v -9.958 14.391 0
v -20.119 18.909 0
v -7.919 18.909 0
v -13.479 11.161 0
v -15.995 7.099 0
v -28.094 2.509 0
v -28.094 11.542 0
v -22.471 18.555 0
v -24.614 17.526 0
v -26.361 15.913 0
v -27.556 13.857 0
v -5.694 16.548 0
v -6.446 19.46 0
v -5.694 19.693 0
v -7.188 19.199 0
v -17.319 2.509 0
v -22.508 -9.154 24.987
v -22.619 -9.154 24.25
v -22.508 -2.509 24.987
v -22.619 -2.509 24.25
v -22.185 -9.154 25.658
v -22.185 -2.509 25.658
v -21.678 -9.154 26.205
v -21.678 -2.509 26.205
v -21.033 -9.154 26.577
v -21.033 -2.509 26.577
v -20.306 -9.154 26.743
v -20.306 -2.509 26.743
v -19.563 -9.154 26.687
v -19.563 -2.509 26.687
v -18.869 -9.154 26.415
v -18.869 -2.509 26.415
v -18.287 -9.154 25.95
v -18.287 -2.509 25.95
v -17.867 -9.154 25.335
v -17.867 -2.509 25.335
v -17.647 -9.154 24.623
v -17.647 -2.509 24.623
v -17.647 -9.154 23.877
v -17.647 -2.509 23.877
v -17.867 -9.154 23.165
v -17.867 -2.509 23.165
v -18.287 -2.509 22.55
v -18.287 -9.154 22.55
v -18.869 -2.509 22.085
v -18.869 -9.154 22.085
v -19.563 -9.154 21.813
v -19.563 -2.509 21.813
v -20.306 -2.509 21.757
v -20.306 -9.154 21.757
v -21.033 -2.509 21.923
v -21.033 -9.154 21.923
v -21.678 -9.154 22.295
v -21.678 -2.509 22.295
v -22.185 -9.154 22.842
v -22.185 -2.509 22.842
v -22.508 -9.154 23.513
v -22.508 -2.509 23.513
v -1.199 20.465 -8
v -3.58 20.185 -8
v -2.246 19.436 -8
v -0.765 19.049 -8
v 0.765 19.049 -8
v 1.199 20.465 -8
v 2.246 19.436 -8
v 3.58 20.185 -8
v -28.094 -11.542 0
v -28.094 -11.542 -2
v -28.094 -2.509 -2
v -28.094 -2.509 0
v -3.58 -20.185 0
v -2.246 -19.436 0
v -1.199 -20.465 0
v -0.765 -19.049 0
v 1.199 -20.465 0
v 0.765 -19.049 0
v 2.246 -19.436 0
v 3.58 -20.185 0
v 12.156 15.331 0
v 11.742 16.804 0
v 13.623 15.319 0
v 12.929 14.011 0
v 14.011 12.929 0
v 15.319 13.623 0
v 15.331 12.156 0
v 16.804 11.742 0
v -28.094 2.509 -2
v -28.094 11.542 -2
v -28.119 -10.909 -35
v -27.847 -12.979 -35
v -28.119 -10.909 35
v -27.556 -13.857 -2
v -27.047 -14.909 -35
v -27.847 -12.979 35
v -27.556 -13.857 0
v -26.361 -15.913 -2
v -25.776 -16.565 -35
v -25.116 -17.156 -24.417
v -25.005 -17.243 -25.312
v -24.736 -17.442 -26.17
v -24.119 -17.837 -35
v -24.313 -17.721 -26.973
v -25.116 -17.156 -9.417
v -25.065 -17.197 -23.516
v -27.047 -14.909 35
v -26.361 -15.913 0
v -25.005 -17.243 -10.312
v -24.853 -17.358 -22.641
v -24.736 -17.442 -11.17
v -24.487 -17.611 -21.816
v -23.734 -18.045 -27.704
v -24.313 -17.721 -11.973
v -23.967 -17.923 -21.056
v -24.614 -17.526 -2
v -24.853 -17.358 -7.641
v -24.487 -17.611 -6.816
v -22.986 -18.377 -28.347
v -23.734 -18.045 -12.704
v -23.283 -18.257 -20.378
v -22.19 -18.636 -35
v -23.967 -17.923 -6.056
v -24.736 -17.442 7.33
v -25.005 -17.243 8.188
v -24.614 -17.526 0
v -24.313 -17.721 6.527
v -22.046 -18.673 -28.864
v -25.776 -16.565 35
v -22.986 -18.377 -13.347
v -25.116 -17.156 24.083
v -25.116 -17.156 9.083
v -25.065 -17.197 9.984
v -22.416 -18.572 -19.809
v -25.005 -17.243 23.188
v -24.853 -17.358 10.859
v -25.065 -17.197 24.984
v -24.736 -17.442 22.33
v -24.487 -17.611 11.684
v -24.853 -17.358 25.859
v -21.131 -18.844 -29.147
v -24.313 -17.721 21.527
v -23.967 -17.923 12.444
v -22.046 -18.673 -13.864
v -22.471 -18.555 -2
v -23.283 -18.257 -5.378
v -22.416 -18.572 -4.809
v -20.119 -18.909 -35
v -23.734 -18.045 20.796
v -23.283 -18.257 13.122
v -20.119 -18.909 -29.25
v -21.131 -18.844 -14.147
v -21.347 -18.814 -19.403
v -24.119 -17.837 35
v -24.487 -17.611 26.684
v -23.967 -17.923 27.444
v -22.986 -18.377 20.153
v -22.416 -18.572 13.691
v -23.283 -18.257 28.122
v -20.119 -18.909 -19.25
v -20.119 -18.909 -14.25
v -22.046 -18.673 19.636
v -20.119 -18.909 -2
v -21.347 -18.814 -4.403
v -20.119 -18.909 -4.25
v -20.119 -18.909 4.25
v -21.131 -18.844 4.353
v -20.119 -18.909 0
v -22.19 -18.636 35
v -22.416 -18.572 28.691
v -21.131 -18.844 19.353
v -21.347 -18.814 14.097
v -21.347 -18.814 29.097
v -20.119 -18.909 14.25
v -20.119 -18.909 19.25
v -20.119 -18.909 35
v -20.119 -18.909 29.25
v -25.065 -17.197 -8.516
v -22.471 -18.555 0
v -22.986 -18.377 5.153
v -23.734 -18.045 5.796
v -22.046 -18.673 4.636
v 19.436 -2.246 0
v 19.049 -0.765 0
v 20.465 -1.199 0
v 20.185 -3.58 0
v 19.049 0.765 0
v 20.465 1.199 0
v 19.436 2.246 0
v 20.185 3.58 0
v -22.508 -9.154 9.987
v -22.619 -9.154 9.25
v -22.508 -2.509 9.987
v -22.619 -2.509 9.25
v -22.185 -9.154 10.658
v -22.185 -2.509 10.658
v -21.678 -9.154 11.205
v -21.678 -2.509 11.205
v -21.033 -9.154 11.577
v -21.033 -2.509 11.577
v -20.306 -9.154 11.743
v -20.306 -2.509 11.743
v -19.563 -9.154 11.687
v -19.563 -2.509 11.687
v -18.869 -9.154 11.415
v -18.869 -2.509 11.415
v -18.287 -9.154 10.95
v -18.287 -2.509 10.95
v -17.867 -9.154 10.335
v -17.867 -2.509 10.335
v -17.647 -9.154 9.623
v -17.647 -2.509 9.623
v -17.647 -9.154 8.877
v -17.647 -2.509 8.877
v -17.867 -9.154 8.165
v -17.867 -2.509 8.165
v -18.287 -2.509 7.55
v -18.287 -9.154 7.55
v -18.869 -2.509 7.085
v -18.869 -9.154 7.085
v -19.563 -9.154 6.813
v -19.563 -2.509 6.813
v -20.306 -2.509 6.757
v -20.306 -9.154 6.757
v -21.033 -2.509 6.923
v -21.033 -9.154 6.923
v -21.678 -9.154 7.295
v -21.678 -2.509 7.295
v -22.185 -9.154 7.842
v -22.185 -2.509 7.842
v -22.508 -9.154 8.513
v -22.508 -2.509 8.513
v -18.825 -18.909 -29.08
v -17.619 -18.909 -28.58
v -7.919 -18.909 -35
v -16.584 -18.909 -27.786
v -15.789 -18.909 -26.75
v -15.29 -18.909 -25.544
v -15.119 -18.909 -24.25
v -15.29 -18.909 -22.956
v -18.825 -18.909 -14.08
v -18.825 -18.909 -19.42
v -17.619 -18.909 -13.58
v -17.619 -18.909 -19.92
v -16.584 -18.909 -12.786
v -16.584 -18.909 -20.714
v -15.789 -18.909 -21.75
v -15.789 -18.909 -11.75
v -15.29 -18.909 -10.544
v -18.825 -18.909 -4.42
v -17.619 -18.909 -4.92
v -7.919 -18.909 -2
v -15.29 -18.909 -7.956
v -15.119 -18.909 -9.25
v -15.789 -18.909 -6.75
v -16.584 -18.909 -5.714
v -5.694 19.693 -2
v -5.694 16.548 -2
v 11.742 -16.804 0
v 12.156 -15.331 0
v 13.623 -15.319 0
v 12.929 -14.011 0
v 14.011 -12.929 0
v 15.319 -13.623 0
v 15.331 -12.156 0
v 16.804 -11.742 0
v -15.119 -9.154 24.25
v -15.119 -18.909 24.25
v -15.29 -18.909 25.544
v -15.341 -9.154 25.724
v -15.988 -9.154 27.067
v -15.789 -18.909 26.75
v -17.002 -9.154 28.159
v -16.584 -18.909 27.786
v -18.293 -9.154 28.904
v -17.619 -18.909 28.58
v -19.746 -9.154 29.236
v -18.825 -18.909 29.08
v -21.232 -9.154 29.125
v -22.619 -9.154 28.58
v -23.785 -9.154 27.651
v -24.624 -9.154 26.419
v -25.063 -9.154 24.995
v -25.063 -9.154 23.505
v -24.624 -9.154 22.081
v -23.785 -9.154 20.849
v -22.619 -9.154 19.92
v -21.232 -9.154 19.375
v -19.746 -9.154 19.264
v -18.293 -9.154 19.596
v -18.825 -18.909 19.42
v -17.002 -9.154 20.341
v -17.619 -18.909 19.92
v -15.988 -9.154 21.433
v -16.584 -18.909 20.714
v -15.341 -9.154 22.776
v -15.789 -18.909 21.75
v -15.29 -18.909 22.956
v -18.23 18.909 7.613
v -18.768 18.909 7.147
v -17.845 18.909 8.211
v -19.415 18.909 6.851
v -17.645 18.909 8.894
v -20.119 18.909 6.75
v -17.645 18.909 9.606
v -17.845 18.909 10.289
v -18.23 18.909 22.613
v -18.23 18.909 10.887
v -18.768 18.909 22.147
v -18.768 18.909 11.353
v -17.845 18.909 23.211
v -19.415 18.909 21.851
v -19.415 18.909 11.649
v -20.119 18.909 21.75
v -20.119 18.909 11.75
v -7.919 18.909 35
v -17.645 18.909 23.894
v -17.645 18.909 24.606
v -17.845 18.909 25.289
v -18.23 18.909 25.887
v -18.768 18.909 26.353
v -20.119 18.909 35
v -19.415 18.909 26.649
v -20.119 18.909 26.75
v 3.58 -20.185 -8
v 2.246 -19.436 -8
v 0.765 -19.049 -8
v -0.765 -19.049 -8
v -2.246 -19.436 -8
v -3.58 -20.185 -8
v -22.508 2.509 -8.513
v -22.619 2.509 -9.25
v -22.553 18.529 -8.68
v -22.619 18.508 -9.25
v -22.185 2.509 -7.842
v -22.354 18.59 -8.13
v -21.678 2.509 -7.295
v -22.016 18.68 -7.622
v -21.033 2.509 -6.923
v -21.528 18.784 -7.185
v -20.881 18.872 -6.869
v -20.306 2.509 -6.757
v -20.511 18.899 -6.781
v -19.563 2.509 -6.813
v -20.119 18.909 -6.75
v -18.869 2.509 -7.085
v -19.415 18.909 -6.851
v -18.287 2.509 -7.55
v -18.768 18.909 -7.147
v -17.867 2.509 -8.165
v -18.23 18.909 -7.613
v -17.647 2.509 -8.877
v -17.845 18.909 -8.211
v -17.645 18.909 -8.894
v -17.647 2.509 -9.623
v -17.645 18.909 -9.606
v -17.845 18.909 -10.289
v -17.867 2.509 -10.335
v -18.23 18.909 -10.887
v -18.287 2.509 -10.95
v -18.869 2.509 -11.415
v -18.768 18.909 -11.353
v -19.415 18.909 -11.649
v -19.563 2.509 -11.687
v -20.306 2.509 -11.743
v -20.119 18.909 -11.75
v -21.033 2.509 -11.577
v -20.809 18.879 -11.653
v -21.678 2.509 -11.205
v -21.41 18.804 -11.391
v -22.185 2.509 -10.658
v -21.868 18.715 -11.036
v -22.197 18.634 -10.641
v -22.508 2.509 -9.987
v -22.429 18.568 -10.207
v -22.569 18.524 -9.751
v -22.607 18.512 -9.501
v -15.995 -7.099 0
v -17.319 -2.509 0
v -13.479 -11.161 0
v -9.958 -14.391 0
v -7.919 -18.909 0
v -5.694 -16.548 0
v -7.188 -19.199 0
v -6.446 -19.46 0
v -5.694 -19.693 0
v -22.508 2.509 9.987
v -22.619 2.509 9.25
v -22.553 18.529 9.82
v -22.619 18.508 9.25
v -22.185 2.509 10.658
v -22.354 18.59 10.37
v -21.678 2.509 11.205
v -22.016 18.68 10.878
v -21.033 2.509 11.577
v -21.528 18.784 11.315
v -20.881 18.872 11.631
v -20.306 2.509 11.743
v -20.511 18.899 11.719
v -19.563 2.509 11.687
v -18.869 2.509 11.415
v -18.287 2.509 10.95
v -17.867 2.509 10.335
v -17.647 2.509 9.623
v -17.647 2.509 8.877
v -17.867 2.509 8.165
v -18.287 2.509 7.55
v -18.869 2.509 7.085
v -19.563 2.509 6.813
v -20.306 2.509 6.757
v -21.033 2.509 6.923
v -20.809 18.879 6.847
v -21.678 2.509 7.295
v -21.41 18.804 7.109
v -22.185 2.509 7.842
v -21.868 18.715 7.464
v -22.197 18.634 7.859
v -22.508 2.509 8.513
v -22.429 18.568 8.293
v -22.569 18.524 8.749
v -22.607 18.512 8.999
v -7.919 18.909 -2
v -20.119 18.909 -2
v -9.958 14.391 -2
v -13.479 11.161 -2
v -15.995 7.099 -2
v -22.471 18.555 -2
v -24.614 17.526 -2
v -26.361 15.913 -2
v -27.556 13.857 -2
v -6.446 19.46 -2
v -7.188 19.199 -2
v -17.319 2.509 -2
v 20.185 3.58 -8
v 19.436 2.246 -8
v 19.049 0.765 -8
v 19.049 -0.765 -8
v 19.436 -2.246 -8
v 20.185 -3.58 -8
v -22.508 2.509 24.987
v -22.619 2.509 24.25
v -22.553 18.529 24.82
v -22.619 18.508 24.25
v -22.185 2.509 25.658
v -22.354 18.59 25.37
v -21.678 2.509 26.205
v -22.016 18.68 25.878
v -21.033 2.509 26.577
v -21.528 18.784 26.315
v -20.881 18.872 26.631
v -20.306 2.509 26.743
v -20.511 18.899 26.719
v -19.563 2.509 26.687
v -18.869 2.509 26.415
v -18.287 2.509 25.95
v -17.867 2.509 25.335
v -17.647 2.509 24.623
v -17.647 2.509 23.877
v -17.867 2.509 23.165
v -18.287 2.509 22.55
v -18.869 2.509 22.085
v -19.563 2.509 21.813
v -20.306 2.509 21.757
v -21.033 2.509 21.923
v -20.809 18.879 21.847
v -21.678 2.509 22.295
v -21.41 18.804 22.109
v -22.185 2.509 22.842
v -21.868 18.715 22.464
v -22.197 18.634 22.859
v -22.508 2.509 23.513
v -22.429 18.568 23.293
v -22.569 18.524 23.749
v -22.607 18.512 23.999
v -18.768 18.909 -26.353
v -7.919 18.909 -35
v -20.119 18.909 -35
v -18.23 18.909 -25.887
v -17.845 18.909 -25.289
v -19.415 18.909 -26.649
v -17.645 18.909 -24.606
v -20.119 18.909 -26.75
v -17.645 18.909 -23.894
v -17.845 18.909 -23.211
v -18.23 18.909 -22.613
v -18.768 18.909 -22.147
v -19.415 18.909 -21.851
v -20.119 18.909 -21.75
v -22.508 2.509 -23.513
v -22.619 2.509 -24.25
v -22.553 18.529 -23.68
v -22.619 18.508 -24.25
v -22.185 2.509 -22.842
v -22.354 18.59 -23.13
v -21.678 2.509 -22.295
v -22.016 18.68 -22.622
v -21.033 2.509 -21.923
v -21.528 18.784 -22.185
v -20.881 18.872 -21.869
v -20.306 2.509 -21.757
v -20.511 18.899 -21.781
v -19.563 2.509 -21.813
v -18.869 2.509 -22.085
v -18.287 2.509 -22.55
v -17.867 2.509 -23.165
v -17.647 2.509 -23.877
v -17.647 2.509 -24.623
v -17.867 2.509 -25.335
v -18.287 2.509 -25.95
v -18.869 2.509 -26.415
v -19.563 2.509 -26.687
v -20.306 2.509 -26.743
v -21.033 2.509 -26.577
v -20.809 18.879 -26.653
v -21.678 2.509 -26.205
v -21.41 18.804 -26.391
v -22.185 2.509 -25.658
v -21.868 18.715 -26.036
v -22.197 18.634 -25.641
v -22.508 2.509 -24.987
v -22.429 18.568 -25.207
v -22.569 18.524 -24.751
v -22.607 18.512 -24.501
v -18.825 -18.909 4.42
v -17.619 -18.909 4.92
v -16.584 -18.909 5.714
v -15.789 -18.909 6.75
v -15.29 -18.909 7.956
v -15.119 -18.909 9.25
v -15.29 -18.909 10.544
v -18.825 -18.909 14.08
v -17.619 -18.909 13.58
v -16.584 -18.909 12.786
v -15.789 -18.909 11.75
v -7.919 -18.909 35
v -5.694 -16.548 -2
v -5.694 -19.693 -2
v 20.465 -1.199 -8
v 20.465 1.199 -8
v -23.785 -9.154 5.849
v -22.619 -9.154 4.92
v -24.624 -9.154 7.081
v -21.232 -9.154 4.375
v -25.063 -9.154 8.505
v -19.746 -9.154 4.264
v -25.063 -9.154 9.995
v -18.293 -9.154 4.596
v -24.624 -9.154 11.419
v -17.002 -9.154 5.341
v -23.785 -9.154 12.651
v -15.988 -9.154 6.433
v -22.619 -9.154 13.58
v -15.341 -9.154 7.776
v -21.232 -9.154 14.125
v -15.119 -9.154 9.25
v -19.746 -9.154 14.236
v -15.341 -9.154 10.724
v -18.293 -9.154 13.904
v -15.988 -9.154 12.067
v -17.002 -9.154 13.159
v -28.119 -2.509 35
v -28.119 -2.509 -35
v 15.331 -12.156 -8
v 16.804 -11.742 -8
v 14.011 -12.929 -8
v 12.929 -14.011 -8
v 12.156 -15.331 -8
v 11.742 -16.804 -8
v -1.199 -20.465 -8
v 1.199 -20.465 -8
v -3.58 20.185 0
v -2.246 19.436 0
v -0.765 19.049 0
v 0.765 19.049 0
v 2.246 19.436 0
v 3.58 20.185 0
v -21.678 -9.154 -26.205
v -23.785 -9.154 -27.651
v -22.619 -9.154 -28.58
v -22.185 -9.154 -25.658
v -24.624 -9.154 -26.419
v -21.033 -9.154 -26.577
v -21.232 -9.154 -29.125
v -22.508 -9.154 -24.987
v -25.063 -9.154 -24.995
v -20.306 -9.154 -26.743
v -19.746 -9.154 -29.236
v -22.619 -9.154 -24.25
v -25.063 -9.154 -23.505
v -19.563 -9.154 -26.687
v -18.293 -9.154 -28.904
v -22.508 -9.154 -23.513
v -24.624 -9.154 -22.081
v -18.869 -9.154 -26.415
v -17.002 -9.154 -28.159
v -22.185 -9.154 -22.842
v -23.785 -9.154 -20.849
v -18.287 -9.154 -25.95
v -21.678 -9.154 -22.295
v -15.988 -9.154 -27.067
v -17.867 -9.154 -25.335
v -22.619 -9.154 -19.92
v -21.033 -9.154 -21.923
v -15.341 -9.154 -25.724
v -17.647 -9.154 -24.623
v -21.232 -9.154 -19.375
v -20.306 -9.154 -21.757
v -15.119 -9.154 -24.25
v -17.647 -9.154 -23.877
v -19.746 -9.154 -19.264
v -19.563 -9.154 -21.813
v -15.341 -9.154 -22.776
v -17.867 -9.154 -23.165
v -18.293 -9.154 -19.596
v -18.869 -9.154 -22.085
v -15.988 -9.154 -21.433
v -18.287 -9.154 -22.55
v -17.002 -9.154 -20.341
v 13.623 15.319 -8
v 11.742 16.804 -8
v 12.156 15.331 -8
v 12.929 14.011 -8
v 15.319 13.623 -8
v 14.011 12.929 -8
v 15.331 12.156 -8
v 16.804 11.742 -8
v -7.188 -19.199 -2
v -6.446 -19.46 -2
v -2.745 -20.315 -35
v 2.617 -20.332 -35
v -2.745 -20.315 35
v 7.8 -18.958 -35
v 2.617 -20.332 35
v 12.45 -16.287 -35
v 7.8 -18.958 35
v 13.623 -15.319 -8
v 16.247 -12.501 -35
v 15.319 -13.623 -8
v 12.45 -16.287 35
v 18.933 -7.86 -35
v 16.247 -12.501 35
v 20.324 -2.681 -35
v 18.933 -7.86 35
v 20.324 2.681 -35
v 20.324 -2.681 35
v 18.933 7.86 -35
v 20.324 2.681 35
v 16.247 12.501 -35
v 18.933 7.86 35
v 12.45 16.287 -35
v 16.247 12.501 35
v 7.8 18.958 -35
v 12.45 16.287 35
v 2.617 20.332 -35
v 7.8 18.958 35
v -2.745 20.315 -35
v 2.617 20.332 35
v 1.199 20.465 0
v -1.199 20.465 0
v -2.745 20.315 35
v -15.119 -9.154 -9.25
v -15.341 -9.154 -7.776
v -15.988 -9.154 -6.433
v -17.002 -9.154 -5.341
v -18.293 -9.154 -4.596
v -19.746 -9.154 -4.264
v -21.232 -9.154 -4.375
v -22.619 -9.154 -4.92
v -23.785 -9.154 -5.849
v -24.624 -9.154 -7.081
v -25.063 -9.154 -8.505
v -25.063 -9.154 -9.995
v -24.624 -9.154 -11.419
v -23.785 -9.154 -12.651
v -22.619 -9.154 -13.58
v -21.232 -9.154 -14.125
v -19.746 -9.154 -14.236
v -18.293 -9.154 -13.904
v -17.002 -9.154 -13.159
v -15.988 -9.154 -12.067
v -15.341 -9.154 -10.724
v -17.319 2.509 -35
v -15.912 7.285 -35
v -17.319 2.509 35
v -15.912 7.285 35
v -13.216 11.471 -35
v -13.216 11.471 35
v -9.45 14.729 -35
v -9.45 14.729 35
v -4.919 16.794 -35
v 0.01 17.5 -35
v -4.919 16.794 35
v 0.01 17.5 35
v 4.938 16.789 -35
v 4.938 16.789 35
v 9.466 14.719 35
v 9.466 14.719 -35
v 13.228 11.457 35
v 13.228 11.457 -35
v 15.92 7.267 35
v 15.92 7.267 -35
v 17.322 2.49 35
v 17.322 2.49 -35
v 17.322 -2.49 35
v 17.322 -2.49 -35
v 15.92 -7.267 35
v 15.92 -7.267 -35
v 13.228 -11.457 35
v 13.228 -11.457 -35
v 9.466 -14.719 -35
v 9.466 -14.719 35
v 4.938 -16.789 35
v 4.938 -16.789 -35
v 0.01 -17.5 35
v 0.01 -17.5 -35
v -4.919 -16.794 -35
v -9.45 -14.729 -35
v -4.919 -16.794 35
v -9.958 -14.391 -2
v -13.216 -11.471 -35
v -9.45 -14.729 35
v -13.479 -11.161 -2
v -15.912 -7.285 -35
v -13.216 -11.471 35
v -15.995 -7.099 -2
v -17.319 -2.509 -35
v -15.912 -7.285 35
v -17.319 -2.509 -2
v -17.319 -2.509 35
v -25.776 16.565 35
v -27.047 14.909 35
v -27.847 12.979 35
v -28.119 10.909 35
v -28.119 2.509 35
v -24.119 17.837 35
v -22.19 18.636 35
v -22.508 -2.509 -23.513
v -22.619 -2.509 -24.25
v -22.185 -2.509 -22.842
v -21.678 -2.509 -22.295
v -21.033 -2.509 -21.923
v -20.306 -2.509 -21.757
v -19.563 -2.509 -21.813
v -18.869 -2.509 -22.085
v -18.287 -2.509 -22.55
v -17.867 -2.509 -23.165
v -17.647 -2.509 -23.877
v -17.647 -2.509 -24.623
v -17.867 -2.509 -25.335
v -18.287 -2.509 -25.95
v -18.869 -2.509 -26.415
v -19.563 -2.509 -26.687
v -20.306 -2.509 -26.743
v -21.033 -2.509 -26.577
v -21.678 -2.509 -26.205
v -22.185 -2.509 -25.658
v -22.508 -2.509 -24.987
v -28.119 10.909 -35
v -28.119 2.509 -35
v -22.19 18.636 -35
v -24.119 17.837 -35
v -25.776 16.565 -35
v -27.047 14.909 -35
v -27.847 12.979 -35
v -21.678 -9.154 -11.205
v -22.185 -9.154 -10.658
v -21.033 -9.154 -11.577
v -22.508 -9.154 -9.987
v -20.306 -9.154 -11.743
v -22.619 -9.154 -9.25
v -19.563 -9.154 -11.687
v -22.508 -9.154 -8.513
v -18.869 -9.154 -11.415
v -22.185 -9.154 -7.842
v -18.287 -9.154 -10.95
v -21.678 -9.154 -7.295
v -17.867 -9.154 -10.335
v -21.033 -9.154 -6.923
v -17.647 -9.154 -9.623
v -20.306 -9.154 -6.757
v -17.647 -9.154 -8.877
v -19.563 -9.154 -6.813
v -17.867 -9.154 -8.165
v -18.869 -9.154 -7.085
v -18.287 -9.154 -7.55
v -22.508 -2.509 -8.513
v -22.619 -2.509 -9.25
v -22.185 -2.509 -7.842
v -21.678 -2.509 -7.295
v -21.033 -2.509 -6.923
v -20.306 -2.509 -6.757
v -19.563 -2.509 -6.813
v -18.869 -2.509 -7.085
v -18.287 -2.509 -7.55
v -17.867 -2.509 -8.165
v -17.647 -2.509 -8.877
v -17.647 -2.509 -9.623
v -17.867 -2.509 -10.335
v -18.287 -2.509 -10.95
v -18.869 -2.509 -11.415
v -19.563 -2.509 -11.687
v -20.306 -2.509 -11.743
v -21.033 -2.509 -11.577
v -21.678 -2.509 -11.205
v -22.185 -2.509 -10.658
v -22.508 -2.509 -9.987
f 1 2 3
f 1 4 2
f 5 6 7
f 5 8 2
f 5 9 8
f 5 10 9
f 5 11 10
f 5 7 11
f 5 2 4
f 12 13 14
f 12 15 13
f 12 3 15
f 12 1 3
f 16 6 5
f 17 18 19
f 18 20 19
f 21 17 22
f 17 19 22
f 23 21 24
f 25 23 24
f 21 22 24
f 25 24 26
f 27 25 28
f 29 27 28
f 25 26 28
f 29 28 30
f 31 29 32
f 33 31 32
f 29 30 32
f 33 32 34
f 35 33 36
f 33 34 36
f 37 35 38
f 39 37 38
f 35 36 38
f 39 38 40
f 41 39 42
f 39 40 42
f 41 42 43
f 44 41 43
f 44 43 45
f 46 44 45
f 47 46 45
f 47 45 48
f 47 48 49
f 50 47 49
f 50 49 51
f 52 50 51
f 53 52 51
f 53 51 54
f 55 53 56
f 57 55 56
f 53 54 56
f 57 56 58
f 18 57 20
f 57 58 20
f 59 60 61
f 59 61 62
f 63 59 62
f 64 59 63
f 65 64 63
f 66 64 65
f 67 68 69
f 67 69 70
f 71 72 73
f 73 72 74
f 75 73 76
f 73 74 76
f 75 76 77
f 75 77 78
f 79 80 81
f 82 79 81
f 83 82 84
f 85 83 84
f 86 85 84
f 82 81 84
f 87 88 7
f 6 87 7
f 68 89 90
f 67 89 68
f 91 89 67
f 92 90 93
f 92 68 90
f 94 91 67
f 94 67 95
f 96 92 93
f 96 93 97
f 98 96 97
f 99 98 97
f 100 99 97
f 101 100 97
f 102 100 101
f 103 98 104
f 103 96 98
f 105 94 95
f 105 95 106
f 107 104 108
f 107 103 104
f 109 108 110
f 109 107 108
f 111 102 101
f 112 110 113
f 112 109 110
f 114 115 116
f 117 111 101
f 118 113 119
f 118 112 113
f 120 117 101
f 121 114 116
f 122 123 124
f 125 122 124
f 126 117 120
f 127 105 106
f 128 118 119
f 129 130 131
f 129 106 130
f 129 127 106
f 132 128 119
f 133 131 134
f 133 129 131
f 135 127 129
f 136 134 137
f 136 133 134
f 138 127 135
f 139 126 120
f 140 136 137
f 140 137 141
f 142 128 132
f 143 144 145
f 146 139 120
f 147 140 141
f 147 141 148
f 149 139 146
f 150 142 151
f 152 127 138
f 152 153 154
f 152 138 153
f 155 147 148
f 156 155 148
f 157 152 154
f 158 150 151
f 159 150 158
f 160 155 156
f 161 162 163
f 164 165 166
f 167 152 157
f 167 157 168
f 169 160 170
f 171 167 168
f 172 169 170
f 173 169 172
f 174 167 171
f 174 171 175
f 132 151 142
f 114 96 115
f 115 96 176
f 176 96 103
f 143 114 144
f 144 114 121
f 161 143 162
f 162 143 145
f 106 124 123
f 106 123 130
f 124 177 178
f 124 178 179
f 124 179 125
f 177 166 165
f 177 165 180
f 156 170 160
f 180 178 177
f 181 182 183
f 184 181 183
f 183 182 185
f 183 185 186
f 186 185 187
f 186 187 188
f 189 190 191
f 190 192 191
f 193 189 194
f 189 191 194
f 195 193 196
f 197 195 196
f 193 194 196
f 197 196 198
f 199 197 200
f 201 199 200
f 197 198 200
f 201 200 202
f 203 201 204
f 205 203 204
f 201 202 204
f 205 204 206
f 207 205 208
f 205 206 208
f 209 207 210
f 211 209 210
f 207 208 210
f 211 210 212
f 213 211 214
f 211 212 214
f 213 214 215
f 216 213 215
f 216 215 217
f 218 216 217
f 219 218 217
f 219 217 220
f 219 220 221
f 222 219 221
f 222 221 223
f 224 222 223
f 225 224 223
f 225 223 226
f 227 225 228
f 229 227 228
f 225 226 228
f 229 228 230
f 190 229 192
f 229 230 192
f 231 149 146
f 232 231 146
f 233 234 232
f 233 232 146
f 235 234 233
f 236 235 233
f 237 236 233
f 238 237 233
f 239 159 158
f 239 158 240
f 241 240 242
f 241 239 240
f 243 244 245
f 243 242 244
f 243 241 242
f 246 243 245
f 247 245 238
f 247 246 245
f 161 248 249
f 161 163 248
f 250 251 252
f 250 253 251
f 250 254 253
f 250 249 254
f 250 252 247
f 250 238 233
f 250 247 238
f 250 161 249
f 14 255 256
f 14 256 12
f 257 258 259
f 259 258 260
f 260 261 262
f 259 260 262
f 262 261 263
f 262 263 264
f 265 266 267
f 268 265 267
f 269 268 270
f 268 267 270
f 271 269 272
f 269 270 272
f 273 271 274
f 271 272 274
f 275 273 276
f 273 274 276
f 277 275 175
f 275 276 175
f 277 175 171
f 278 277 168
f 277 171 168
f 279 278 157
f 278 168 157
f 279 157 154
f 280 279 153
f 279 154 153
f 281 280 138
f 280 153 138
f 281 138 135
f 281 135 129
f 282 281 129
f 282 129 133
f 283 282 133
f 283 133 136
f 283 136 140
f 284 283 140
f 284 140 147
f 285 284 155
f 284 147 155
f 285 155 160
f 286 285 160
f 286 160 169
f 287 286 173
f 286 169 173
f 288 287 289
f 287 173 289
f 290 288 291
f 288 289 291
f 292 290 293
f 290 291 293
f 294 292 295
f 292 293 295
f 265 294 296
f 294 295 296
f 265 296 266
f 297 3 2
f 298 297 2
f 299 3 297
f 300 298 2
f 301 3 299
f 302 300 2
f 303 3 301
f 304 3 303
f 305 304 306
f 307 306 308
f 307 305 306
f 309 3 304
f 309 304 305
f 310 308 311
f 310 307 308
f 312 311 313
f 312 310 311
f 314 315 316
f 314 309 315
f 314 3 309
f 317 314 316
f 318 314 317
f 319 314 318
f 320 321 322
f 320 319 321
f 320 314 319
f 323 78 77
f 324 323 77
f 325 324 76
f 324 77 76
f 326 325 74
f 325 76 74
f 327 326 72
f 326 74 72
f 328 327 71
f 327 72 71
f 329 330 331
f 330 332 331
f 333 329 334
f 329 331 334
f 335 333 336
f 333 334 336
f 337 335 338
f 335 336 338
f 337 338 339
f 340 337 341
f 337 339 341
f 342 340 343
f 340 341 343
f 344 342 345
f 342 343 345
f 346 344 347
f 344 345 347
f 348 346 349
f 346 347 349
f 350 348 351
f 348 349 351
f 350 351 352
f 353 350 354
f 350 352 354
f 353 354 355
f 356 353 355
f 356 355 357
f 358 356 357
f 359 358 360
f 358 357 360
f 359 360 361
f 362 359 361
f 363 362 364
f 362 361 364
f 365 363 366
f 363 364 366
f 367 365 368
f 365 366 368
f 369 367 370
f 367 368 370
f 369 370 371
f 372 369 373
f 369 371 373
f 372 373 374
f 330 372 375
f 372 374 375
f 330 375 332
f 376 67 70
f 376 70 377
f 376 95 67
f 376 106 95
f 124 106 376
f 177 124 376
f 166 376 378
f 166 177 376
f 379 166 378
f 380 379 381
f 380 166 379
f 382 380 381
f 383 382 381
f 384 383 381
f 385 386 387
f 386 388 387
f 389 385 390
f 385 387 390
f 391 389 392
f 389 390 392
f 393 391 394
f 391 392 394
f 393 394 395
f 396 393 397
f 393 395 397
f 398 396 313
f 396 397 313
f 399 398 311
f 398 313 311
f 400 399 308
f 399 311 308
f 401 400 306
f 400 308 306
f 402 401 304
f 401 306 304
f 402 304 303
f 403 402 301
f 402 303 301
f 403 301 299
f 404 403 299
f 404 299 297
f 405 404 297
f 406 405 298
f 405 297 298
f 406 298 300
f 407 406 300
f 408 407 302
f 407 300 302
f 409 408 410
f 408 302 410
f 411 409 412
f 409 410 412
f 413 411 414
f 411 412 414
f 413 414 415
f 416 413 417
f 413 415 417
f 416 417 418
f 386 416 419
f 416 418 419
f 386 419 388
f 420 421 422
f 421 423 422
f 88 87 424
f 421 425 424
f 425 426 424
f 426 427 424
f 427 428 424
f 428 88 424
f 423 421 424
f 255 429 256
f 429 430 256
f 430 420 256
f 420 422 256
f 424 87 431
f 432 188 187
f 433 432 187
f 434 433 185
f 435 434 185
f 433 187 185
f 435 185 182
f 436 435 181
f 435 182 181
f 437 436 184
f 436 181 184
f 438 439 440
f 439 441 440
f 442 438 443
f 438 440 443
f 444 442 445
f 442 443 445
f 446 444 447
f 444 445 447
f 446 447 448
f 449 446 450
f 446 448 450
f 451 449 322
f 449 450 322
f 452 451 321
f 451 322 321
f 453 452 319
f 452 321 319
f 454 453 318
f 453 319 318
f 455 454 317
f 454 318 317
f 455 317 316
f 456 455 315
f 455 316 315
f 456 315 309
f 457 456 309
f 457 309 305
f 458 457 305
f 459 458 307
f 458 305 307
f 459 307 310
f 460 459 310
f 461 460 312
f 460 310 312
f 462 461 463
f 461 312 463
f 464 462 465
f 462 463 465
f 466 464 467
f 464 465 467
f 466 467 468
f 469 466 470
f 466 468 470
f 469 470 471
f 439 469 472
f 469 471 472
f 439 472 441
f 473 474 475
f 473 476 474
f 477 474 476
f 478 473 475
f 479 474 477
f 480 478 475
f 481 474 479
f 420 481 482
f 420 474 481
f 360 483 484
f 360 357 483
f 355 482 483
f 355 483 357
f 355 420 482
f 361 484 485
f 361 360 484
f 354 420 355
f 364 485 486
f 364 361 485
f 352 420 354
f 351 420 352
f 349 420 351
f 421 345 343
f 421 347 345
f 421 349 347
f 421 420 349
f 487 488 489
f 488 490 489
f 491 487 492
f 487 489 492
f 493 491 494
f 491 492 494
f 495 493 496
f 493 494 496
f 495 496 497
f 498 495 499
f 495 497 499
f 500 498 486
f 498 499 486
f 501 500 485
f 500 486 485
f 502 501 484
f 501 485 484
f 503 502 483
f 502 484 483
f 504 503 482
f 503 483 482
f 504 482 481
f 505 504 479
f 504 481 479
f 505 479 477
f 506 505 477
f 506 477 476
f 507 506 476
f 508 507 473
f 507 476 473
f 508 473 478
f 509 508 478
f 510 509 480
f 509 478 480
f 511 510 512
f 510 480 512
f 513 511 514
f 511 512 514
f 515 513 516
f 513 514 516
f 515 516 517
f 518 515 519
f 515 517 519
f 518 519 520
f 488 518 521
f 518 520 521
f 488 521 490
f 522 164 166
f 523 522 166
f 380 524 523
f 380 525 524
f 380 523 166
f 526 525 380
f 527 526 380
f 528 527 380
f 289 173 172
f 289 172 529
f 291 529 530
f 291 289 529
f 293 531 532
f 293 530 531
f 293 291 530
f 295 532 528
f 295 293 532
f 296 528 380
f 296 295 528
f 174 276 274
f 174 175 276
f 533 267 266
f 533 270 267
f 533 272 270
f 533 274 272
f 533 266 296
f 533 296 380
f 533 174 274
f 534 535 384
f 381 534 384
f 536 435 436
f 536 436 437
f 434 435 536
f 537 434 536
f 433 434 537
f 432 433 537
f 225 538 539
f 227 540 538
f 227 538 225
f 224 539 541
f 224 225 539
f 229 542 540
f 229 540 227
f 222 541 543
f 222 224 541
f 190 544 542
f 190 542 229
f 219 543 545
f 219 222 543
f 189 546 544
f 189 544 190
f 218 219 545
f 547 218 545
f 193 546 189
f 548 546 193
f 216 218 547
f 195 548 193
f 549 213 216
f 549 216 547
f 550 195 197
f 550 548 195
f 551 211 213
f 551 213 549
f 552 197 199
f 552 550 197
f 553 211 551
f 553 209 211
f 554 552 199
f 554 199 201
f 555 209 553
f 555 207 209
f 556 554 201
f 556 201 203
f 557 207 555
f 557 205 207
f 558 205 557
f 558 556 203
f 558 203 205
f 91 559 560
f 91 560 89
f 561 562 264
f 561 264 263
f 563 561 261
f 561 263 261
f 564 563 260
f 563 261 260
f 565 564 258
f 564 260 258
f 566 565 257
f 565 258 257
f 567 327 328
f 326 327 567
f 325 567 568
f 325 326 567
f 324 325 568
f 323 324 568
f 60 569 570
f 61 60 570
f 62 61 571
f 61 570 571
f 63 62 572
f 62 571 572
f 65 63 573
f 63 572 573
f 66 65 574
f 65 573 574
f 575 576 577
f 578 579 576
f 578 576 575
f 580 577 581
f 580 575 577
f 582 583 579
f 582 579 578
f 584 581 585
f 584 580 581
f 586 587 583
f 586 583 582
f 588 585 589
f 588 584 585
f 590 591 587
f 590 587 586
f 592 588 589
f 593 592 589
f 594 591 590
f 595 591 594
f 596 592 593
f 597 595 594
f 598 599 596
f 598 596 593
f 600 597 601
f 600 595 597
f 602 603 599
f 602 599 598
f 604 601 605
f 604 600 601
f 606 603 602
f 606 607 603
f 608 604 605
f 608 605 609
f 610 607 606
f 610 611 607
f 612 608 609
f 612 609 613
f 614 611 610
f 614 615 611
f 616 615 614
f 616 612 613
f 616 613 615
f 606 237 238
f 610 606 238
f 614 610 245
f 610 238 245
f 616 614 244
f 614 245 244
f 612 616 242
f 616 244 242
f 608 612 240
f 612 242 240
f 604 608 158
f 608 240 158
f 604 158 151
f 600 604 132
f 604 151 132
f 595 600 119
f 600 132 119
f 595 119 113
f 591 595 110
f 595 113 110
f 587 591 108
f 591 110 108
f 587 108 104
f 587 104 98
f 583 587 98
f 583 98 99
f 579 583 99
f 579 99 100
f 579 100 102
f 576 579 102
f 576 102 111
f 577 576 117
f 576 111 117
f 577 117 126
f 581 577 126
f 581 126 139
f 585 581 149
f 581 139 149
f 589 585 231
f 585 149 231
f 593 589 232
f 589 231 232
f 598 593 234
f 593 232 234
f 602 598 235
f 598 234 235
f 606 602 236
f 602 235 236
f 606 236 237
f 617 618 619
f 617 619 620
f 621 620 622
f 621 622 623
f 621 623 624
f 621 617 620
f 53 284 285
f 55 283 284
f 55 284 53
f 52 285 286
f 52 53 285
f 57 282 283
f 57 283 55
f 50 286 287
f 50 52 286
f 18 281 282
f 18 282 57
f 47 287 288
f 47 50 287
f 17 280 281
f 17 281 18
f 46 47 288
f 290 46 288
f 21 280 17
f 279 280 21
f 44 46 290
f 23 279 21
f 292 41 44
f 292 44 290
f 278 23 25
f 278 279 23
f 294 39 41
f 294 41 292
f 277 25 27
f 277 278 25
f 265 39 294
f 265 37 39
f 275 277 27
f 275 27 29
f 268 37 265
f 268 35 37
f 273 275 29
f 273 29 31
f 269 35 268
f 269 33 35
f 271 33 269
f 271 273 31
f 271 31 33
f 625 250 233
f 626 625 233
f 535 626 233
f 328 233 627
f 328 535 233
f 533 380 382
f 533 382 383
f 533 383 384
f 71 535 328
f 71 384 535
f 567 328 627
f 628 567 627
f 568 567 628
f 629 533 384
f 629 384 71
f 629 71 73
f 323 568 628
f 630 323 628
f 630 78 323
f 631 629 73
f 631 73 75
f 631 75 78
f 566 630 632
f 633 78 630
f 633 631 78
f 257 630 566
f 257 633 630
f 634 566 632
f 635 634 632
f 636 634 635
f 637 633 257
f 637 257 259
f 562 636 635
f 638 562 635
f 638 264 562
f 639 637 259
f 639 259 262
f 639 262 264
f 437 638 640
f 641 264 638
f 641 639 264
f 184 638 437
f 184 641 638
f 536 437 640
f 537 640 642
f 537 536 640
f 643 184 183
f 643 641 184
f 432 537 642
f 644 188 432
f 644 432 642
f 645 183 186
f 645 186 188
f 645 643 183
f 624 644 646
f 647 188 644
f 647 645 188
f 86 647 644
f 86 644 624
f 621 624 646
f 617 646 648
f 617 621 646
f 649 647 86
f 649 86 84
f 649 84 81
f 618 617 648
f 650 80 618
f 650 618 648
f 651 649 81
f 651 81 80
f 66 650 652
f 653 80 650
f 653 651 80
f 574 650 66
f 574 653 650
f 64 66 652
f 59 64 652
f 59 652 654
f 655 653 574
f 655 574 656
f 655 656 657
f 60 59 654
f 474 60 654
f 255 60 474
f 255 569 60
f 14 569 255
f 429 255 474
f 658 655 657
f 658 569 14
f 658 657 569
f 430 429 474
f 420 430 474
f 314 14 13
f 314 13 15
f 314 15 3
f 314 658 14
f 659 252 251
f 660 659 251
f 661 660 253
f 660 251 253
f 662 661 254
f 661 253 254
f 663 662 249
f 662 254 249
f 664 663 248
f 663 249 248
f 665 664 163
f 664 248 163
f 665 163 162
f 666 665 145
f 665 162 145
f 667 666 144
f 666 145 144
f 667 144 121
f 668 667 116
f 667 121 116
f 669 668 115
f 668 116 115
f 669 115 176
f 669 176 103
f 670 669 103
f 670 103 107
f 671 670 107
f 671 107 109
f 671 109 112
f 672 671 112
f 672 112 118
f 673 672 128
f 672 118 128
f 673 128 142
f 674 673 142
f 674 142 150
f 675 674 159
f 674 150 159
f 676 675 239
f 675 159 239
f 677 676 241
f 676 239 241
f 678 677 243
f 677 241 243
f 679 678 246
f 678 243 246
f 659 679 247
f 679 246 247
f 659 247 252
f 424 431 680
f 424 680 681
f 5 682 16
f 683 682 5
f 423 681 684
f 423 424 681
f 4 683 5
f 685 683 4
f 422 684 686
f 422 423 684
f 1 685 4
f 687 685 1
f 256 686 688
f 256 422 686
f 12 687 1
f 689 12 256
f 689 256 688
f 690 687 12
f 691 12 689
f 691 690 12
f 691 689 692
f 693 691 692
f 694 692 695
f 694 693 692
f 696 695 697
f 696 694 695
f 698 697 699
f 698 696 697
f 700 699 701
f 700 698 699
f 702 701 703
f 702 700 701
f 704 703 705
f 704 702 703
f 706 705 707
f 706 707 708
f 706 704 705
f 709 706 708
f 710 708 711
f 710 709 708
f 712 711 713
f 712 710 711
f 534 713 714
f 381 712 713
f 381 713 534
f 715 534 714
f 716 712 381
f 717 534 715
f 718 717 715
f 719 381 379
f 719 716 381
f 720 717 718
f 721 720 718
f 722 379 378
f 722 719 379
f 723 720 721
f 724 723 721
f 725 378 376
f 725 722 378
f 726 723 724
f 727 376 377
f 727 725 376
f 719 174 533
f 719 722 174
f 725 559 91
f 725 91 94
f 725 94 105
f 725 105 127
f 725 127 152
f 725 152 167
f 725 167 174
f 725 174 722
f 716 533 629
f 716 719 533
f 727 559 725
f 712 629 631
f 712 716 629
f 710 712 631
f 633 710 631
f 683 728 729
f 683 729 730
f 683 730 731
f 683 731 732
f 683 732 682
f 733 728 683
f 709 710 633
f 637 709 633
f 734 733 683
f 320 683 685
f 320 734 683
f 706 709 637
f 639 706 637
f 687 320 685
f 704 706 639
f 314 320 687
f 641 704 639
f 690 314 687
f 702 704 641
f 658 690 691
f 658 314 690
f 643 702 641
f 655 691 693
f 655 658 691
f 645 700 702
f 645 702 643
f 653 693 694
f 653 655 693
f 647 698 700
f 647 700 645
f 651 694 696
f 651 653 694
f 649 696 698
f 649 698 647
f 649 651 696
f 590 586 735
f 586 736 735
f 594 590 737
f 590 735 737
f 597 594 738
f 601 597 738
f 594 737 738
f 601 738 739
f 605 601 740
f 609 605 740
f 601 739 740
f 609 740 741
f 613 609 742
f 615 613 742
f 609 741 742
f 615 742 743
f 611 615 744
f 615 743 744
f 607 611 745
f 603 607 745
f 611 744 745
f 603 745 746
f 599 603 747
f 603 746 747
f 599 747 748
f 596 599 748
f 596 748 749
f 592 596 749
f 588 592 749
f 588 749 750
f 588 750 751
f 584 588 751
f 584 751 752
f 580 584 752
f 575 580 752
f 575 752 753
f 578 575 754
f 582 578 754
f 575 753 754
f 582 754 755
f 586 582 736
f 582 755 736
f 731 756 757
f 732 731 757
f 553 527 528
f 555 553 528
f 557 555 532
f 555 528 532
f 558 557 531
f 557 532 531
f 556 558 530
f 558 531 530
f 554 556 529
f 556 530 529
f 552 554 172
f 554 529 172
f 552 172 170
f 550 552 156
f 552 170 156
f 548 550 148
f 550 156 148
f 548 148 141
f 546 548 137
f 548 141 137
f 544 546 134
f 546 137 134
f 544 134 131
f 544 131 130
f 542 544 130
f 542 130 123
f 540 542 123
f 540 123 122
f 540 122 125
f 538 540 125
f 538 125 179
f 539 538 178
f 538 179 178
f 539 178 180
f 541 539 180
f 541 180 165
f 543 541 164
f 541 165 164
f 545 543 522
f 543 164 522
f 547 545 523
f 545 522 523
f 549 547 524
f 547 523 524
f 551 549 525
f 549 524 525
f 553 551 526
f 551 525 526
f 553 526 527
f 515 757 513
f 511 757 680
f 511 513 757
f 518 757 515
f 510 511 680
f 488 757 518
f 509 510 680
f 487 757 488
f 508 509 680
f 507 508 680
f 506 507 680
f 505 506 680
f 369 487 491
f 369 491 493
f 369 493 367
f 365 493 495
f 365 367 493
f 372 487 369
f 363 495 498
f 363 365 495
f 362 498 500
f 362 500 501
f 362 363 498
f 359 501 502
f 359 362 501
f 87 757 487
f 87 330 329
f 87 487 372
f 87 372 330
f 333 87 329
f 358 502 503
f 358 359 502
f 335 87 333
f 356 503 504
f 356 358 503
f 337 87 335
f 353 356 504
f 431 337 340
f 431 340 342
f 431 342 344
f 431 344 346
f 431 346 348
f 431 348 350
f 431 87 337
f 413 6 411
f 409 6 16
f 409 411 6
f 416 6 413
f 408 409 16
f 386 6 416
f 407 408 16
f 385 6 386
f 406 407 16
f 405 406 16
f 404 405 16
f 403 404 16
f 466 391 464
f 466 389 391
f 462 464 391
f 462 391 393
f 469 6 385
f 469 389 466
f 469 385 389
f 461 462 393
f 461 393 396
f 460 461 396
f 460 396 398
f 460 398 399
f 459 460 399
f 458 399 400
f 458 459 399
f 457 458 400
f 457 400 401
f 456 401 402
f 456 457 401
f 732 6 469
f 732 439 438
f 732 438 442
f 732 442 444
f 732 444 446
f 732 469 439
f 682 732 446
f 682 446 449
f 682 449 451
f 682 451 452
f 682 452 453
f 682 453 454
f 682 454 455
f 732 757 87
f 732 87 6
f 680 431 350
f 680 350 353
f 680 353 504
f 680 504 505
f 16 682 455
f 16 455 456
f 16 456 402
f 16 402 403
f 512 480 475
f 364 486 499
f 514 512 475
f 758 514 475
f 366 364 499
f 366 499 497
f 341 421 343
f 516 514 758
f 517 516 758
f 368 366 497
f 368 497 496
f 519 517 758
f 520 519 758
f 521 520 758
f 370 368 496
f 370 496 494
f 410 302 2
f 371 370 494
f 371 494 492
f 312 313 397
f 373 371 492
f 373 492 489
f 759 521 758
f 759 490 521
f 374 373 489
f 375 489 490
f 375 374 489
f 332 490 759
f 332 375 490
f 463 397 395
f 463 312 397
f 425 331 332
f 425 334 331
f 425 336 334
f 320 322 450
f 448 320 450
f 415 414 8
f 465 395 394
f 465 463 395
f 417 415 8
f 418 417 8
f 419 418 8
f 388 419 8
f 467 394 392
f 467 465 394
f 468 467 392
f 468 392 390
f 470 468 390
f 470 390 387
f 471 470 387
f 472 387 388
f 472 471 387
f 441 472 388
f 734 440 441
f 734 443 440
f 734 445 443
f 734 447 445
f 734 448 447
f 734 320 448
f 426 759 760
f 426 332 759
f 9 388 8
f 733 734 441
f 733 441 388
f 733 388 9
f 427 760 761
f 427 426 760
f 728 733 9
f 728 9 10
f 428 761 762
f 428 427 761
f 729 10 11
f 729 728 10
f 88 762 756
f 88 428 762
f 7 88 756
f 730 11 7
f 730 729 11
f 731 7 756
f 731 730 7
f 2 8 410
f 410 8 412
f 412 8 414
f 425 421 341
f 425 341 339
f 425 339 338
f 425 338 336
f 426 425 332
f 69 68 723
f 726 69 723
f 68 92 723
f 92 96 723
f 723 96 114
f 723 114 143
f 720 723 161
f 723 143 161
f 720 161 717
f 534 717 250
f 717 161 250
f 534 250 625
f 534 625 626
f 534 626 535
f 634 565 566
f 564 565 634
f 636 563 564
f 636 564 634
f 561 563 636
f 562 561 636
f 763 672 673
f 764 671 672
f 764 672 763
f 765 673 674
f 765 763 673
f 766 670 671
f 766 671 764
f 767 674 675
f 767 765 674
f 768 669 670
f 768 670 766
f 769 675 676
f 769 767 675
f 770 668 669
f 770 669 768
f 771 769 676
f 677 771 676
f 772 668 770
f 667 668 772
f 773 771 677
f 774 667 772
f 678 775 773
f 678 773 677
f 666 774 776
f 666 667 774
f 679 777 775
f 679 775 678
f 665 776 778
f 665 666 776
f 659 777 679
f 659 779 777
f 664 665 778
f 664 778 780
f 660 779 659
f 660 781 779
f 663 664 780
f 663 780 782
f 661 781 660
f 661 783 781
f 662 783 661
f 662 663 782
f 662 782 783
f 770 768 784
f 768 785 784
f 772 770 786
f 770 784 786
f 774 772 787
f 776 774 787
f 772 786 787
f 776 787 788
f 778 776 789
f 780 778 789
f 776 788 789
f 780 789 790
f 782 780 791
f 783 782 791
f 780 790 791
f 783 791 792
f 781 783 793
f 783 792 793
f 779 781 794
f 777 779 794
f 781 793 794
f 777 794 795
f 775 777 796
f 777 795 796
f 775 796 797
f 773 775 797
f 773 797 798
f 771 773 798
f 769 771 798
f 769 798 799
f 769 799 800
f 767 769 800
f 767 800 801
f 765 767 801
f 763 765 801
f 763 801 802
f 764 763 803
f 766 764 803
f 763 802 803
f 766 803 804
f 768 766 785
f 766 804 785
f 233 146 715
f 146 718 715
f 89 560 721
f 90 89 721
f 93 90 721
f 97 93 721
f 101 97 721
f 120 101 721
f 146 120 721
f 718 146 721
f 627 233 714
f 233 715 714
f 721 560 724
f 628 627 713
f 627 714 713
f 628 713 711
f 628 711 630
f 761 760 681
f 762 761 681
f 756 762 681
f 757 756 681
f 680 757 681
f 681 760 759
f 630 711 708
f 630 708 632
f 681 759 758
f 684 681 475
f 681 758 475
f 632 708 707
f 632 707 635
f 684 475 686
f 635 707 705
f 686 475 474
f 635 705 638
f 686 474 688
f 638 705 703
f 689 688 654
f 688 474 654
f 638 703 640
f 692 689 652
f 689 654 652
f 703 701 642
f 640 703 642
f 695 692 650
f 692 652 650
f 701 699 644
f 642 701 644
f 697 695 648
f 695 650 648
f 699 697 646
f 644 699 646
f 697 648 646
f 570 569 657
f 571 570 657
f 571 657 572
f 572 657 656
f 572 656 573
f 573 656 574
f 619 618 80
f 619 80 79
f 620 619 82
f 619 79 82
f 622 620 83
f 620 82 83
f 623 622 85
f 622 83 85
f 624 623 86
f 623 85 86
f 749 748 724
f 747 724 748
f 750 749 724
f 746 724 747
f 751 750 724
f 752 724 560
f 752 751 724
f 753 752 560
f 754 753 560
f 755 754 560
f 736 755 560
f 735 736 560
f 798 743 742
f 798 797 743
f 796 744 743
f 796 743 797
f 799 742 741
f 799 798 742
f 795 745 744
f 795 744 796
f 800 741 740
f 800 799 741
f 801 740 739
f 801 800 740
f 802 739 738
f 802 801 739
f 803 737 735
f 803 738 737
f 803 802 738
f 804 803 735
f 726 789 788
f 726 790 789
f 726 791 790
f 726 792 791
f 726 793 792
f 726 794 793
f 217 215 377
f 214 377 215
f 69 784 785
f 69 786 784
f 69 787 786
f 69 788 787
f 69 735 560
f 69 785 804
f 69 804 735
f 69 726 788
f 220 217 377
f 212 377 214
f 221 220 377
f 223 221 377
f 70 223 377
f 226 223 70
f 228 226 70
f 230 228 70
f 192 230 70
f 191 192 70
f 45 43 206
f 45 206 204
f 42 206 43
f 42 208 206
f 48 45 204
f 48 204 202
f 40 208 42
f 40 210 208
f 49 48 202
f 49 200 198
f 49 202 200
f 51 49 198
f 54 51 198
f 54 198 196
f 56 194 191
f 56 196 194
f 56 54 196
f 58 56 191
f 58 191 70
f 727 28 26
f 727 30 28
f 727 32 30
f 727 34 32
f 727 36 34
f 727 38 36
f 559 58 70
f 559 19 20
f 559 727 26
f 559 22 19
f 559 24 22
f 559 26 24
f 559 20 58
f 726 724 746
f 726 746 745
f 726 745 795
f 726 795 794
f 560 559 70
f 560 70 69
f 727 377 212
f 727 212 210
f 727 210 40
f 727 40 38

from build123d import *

# Parameters (mm, degrees)
F1_DEPTH       = 35
F3_D           = 5
F3_START       = 1.7550021
F3_CBORE_D     = 10
F3_CBORE_DEPTH = 8
F4_W           = 22.4
F4_H           = 2
F5_DEPTH       = 25
F6_R           = 6
F7_DEPTH       = 8


with BuildPart() as f1:
    # F0 (on Top) → F1 (new body, symmetric)
    with BuildSketch(Plane.XY):
        with BuildLine():
            ThreePointArc((-17.3192642082, 2.5086026559), (17.5, 0), (-17.3192642082, -2.5086026559))
            Line((-17.3192642082, -2.5086026559), (-20.3459311096, -2.5086026559))
            ThreePointArc((-20.3459311096, -2.5086026559), (-16.3392263155, -12.3806172468), (-7.9192642082, -18.9086026559))
            ThreePointArc((-7.9192642082, -18.9086026559), (20.5, 0), (-7.9192642082, 18.9086026559))
            Line((-7.9192642082, 18.9086026559), (-20.1192642082, 18.9086026559))
            ThreePointArc((-20.1192642082, 18.9086026559), (-25.7761184577, 16.5654569054), (-28.1192642082, 10.9086026559))
            Line((-28.1192642082, 10.9086026559), (-28.1192642082, 2.5086026559))
            Line((-28.1192642082, 2.5086026559), (-17.3192642082, 2.5086026559))
        make_face()
        with BuildLine():
            ThreePointArc((-7.9192642082, -18.9086026559), (-16.3392263155, -12.3806172468), (-20.3459311096, -2.5086026559))
            Line((-20.3459311096, -2.5086026559), (-28.1192642082, -2.5086026559))
            Line((-28.1192642082, -2.5086026559), (-28.1192642082, -10.9086026559))
            ThreePointArc((-28.1192642082, -10.9086026559), (-25.7761184577, -16.5654569054), (-20.1192642082, -18.9086026559))
            Line((-20.1192642082, -18.9086026559), (-7.9192642082, -18.9086026559))
        make_face()
    extrude(amount=F1_DEPTH, both=True)

    # F3 (through all)
    # its depths count from where the whole tool has entered the part; down to there all is cleared
    with Locations(Plane.XZ.offset(18.9086026559).offset(-F3_START)):
        with Locations((-20.1192642082, -24.25), (-20.1192642082, -9.25), (-20.1192642082, 9.25), (-20.1192642082, 24.25)):
            CounterBoreHole(F3_D / 2, F3_CBORE_D / 2, F3_CBORE_DEPTH)

    # F4 (on Front) → F5 (cut, symmetric)
    with BuildSketch(Plane.XZ):
        with Locations((-16.8941898715, -1)):
            Rectangle(F4_W, F4_H)
    extrude(amount=F5_DEPTH, both=True, mode=Mode.SUBTRACT)

    # F6 (on Top) → F7 (cut)
    with BuildSketch(Plane.XY):
        with Locations((0, -25)):
            Circle(F6_R)
        with Locations((17.6776695297, -17.6776695297)):
            Circle(F6_R)
        with Locations((25, 0)):
            Circle(F6_R)
        with Locations((17.6776695297, 17.6776695297)):
            Circle(F6_R)
        with Locations((0, 25)):
            Circle(F6_R)
    extrude(amount=-F7_DEPTH, mode=Mode.SUBTRACT)


solid = f1.part
